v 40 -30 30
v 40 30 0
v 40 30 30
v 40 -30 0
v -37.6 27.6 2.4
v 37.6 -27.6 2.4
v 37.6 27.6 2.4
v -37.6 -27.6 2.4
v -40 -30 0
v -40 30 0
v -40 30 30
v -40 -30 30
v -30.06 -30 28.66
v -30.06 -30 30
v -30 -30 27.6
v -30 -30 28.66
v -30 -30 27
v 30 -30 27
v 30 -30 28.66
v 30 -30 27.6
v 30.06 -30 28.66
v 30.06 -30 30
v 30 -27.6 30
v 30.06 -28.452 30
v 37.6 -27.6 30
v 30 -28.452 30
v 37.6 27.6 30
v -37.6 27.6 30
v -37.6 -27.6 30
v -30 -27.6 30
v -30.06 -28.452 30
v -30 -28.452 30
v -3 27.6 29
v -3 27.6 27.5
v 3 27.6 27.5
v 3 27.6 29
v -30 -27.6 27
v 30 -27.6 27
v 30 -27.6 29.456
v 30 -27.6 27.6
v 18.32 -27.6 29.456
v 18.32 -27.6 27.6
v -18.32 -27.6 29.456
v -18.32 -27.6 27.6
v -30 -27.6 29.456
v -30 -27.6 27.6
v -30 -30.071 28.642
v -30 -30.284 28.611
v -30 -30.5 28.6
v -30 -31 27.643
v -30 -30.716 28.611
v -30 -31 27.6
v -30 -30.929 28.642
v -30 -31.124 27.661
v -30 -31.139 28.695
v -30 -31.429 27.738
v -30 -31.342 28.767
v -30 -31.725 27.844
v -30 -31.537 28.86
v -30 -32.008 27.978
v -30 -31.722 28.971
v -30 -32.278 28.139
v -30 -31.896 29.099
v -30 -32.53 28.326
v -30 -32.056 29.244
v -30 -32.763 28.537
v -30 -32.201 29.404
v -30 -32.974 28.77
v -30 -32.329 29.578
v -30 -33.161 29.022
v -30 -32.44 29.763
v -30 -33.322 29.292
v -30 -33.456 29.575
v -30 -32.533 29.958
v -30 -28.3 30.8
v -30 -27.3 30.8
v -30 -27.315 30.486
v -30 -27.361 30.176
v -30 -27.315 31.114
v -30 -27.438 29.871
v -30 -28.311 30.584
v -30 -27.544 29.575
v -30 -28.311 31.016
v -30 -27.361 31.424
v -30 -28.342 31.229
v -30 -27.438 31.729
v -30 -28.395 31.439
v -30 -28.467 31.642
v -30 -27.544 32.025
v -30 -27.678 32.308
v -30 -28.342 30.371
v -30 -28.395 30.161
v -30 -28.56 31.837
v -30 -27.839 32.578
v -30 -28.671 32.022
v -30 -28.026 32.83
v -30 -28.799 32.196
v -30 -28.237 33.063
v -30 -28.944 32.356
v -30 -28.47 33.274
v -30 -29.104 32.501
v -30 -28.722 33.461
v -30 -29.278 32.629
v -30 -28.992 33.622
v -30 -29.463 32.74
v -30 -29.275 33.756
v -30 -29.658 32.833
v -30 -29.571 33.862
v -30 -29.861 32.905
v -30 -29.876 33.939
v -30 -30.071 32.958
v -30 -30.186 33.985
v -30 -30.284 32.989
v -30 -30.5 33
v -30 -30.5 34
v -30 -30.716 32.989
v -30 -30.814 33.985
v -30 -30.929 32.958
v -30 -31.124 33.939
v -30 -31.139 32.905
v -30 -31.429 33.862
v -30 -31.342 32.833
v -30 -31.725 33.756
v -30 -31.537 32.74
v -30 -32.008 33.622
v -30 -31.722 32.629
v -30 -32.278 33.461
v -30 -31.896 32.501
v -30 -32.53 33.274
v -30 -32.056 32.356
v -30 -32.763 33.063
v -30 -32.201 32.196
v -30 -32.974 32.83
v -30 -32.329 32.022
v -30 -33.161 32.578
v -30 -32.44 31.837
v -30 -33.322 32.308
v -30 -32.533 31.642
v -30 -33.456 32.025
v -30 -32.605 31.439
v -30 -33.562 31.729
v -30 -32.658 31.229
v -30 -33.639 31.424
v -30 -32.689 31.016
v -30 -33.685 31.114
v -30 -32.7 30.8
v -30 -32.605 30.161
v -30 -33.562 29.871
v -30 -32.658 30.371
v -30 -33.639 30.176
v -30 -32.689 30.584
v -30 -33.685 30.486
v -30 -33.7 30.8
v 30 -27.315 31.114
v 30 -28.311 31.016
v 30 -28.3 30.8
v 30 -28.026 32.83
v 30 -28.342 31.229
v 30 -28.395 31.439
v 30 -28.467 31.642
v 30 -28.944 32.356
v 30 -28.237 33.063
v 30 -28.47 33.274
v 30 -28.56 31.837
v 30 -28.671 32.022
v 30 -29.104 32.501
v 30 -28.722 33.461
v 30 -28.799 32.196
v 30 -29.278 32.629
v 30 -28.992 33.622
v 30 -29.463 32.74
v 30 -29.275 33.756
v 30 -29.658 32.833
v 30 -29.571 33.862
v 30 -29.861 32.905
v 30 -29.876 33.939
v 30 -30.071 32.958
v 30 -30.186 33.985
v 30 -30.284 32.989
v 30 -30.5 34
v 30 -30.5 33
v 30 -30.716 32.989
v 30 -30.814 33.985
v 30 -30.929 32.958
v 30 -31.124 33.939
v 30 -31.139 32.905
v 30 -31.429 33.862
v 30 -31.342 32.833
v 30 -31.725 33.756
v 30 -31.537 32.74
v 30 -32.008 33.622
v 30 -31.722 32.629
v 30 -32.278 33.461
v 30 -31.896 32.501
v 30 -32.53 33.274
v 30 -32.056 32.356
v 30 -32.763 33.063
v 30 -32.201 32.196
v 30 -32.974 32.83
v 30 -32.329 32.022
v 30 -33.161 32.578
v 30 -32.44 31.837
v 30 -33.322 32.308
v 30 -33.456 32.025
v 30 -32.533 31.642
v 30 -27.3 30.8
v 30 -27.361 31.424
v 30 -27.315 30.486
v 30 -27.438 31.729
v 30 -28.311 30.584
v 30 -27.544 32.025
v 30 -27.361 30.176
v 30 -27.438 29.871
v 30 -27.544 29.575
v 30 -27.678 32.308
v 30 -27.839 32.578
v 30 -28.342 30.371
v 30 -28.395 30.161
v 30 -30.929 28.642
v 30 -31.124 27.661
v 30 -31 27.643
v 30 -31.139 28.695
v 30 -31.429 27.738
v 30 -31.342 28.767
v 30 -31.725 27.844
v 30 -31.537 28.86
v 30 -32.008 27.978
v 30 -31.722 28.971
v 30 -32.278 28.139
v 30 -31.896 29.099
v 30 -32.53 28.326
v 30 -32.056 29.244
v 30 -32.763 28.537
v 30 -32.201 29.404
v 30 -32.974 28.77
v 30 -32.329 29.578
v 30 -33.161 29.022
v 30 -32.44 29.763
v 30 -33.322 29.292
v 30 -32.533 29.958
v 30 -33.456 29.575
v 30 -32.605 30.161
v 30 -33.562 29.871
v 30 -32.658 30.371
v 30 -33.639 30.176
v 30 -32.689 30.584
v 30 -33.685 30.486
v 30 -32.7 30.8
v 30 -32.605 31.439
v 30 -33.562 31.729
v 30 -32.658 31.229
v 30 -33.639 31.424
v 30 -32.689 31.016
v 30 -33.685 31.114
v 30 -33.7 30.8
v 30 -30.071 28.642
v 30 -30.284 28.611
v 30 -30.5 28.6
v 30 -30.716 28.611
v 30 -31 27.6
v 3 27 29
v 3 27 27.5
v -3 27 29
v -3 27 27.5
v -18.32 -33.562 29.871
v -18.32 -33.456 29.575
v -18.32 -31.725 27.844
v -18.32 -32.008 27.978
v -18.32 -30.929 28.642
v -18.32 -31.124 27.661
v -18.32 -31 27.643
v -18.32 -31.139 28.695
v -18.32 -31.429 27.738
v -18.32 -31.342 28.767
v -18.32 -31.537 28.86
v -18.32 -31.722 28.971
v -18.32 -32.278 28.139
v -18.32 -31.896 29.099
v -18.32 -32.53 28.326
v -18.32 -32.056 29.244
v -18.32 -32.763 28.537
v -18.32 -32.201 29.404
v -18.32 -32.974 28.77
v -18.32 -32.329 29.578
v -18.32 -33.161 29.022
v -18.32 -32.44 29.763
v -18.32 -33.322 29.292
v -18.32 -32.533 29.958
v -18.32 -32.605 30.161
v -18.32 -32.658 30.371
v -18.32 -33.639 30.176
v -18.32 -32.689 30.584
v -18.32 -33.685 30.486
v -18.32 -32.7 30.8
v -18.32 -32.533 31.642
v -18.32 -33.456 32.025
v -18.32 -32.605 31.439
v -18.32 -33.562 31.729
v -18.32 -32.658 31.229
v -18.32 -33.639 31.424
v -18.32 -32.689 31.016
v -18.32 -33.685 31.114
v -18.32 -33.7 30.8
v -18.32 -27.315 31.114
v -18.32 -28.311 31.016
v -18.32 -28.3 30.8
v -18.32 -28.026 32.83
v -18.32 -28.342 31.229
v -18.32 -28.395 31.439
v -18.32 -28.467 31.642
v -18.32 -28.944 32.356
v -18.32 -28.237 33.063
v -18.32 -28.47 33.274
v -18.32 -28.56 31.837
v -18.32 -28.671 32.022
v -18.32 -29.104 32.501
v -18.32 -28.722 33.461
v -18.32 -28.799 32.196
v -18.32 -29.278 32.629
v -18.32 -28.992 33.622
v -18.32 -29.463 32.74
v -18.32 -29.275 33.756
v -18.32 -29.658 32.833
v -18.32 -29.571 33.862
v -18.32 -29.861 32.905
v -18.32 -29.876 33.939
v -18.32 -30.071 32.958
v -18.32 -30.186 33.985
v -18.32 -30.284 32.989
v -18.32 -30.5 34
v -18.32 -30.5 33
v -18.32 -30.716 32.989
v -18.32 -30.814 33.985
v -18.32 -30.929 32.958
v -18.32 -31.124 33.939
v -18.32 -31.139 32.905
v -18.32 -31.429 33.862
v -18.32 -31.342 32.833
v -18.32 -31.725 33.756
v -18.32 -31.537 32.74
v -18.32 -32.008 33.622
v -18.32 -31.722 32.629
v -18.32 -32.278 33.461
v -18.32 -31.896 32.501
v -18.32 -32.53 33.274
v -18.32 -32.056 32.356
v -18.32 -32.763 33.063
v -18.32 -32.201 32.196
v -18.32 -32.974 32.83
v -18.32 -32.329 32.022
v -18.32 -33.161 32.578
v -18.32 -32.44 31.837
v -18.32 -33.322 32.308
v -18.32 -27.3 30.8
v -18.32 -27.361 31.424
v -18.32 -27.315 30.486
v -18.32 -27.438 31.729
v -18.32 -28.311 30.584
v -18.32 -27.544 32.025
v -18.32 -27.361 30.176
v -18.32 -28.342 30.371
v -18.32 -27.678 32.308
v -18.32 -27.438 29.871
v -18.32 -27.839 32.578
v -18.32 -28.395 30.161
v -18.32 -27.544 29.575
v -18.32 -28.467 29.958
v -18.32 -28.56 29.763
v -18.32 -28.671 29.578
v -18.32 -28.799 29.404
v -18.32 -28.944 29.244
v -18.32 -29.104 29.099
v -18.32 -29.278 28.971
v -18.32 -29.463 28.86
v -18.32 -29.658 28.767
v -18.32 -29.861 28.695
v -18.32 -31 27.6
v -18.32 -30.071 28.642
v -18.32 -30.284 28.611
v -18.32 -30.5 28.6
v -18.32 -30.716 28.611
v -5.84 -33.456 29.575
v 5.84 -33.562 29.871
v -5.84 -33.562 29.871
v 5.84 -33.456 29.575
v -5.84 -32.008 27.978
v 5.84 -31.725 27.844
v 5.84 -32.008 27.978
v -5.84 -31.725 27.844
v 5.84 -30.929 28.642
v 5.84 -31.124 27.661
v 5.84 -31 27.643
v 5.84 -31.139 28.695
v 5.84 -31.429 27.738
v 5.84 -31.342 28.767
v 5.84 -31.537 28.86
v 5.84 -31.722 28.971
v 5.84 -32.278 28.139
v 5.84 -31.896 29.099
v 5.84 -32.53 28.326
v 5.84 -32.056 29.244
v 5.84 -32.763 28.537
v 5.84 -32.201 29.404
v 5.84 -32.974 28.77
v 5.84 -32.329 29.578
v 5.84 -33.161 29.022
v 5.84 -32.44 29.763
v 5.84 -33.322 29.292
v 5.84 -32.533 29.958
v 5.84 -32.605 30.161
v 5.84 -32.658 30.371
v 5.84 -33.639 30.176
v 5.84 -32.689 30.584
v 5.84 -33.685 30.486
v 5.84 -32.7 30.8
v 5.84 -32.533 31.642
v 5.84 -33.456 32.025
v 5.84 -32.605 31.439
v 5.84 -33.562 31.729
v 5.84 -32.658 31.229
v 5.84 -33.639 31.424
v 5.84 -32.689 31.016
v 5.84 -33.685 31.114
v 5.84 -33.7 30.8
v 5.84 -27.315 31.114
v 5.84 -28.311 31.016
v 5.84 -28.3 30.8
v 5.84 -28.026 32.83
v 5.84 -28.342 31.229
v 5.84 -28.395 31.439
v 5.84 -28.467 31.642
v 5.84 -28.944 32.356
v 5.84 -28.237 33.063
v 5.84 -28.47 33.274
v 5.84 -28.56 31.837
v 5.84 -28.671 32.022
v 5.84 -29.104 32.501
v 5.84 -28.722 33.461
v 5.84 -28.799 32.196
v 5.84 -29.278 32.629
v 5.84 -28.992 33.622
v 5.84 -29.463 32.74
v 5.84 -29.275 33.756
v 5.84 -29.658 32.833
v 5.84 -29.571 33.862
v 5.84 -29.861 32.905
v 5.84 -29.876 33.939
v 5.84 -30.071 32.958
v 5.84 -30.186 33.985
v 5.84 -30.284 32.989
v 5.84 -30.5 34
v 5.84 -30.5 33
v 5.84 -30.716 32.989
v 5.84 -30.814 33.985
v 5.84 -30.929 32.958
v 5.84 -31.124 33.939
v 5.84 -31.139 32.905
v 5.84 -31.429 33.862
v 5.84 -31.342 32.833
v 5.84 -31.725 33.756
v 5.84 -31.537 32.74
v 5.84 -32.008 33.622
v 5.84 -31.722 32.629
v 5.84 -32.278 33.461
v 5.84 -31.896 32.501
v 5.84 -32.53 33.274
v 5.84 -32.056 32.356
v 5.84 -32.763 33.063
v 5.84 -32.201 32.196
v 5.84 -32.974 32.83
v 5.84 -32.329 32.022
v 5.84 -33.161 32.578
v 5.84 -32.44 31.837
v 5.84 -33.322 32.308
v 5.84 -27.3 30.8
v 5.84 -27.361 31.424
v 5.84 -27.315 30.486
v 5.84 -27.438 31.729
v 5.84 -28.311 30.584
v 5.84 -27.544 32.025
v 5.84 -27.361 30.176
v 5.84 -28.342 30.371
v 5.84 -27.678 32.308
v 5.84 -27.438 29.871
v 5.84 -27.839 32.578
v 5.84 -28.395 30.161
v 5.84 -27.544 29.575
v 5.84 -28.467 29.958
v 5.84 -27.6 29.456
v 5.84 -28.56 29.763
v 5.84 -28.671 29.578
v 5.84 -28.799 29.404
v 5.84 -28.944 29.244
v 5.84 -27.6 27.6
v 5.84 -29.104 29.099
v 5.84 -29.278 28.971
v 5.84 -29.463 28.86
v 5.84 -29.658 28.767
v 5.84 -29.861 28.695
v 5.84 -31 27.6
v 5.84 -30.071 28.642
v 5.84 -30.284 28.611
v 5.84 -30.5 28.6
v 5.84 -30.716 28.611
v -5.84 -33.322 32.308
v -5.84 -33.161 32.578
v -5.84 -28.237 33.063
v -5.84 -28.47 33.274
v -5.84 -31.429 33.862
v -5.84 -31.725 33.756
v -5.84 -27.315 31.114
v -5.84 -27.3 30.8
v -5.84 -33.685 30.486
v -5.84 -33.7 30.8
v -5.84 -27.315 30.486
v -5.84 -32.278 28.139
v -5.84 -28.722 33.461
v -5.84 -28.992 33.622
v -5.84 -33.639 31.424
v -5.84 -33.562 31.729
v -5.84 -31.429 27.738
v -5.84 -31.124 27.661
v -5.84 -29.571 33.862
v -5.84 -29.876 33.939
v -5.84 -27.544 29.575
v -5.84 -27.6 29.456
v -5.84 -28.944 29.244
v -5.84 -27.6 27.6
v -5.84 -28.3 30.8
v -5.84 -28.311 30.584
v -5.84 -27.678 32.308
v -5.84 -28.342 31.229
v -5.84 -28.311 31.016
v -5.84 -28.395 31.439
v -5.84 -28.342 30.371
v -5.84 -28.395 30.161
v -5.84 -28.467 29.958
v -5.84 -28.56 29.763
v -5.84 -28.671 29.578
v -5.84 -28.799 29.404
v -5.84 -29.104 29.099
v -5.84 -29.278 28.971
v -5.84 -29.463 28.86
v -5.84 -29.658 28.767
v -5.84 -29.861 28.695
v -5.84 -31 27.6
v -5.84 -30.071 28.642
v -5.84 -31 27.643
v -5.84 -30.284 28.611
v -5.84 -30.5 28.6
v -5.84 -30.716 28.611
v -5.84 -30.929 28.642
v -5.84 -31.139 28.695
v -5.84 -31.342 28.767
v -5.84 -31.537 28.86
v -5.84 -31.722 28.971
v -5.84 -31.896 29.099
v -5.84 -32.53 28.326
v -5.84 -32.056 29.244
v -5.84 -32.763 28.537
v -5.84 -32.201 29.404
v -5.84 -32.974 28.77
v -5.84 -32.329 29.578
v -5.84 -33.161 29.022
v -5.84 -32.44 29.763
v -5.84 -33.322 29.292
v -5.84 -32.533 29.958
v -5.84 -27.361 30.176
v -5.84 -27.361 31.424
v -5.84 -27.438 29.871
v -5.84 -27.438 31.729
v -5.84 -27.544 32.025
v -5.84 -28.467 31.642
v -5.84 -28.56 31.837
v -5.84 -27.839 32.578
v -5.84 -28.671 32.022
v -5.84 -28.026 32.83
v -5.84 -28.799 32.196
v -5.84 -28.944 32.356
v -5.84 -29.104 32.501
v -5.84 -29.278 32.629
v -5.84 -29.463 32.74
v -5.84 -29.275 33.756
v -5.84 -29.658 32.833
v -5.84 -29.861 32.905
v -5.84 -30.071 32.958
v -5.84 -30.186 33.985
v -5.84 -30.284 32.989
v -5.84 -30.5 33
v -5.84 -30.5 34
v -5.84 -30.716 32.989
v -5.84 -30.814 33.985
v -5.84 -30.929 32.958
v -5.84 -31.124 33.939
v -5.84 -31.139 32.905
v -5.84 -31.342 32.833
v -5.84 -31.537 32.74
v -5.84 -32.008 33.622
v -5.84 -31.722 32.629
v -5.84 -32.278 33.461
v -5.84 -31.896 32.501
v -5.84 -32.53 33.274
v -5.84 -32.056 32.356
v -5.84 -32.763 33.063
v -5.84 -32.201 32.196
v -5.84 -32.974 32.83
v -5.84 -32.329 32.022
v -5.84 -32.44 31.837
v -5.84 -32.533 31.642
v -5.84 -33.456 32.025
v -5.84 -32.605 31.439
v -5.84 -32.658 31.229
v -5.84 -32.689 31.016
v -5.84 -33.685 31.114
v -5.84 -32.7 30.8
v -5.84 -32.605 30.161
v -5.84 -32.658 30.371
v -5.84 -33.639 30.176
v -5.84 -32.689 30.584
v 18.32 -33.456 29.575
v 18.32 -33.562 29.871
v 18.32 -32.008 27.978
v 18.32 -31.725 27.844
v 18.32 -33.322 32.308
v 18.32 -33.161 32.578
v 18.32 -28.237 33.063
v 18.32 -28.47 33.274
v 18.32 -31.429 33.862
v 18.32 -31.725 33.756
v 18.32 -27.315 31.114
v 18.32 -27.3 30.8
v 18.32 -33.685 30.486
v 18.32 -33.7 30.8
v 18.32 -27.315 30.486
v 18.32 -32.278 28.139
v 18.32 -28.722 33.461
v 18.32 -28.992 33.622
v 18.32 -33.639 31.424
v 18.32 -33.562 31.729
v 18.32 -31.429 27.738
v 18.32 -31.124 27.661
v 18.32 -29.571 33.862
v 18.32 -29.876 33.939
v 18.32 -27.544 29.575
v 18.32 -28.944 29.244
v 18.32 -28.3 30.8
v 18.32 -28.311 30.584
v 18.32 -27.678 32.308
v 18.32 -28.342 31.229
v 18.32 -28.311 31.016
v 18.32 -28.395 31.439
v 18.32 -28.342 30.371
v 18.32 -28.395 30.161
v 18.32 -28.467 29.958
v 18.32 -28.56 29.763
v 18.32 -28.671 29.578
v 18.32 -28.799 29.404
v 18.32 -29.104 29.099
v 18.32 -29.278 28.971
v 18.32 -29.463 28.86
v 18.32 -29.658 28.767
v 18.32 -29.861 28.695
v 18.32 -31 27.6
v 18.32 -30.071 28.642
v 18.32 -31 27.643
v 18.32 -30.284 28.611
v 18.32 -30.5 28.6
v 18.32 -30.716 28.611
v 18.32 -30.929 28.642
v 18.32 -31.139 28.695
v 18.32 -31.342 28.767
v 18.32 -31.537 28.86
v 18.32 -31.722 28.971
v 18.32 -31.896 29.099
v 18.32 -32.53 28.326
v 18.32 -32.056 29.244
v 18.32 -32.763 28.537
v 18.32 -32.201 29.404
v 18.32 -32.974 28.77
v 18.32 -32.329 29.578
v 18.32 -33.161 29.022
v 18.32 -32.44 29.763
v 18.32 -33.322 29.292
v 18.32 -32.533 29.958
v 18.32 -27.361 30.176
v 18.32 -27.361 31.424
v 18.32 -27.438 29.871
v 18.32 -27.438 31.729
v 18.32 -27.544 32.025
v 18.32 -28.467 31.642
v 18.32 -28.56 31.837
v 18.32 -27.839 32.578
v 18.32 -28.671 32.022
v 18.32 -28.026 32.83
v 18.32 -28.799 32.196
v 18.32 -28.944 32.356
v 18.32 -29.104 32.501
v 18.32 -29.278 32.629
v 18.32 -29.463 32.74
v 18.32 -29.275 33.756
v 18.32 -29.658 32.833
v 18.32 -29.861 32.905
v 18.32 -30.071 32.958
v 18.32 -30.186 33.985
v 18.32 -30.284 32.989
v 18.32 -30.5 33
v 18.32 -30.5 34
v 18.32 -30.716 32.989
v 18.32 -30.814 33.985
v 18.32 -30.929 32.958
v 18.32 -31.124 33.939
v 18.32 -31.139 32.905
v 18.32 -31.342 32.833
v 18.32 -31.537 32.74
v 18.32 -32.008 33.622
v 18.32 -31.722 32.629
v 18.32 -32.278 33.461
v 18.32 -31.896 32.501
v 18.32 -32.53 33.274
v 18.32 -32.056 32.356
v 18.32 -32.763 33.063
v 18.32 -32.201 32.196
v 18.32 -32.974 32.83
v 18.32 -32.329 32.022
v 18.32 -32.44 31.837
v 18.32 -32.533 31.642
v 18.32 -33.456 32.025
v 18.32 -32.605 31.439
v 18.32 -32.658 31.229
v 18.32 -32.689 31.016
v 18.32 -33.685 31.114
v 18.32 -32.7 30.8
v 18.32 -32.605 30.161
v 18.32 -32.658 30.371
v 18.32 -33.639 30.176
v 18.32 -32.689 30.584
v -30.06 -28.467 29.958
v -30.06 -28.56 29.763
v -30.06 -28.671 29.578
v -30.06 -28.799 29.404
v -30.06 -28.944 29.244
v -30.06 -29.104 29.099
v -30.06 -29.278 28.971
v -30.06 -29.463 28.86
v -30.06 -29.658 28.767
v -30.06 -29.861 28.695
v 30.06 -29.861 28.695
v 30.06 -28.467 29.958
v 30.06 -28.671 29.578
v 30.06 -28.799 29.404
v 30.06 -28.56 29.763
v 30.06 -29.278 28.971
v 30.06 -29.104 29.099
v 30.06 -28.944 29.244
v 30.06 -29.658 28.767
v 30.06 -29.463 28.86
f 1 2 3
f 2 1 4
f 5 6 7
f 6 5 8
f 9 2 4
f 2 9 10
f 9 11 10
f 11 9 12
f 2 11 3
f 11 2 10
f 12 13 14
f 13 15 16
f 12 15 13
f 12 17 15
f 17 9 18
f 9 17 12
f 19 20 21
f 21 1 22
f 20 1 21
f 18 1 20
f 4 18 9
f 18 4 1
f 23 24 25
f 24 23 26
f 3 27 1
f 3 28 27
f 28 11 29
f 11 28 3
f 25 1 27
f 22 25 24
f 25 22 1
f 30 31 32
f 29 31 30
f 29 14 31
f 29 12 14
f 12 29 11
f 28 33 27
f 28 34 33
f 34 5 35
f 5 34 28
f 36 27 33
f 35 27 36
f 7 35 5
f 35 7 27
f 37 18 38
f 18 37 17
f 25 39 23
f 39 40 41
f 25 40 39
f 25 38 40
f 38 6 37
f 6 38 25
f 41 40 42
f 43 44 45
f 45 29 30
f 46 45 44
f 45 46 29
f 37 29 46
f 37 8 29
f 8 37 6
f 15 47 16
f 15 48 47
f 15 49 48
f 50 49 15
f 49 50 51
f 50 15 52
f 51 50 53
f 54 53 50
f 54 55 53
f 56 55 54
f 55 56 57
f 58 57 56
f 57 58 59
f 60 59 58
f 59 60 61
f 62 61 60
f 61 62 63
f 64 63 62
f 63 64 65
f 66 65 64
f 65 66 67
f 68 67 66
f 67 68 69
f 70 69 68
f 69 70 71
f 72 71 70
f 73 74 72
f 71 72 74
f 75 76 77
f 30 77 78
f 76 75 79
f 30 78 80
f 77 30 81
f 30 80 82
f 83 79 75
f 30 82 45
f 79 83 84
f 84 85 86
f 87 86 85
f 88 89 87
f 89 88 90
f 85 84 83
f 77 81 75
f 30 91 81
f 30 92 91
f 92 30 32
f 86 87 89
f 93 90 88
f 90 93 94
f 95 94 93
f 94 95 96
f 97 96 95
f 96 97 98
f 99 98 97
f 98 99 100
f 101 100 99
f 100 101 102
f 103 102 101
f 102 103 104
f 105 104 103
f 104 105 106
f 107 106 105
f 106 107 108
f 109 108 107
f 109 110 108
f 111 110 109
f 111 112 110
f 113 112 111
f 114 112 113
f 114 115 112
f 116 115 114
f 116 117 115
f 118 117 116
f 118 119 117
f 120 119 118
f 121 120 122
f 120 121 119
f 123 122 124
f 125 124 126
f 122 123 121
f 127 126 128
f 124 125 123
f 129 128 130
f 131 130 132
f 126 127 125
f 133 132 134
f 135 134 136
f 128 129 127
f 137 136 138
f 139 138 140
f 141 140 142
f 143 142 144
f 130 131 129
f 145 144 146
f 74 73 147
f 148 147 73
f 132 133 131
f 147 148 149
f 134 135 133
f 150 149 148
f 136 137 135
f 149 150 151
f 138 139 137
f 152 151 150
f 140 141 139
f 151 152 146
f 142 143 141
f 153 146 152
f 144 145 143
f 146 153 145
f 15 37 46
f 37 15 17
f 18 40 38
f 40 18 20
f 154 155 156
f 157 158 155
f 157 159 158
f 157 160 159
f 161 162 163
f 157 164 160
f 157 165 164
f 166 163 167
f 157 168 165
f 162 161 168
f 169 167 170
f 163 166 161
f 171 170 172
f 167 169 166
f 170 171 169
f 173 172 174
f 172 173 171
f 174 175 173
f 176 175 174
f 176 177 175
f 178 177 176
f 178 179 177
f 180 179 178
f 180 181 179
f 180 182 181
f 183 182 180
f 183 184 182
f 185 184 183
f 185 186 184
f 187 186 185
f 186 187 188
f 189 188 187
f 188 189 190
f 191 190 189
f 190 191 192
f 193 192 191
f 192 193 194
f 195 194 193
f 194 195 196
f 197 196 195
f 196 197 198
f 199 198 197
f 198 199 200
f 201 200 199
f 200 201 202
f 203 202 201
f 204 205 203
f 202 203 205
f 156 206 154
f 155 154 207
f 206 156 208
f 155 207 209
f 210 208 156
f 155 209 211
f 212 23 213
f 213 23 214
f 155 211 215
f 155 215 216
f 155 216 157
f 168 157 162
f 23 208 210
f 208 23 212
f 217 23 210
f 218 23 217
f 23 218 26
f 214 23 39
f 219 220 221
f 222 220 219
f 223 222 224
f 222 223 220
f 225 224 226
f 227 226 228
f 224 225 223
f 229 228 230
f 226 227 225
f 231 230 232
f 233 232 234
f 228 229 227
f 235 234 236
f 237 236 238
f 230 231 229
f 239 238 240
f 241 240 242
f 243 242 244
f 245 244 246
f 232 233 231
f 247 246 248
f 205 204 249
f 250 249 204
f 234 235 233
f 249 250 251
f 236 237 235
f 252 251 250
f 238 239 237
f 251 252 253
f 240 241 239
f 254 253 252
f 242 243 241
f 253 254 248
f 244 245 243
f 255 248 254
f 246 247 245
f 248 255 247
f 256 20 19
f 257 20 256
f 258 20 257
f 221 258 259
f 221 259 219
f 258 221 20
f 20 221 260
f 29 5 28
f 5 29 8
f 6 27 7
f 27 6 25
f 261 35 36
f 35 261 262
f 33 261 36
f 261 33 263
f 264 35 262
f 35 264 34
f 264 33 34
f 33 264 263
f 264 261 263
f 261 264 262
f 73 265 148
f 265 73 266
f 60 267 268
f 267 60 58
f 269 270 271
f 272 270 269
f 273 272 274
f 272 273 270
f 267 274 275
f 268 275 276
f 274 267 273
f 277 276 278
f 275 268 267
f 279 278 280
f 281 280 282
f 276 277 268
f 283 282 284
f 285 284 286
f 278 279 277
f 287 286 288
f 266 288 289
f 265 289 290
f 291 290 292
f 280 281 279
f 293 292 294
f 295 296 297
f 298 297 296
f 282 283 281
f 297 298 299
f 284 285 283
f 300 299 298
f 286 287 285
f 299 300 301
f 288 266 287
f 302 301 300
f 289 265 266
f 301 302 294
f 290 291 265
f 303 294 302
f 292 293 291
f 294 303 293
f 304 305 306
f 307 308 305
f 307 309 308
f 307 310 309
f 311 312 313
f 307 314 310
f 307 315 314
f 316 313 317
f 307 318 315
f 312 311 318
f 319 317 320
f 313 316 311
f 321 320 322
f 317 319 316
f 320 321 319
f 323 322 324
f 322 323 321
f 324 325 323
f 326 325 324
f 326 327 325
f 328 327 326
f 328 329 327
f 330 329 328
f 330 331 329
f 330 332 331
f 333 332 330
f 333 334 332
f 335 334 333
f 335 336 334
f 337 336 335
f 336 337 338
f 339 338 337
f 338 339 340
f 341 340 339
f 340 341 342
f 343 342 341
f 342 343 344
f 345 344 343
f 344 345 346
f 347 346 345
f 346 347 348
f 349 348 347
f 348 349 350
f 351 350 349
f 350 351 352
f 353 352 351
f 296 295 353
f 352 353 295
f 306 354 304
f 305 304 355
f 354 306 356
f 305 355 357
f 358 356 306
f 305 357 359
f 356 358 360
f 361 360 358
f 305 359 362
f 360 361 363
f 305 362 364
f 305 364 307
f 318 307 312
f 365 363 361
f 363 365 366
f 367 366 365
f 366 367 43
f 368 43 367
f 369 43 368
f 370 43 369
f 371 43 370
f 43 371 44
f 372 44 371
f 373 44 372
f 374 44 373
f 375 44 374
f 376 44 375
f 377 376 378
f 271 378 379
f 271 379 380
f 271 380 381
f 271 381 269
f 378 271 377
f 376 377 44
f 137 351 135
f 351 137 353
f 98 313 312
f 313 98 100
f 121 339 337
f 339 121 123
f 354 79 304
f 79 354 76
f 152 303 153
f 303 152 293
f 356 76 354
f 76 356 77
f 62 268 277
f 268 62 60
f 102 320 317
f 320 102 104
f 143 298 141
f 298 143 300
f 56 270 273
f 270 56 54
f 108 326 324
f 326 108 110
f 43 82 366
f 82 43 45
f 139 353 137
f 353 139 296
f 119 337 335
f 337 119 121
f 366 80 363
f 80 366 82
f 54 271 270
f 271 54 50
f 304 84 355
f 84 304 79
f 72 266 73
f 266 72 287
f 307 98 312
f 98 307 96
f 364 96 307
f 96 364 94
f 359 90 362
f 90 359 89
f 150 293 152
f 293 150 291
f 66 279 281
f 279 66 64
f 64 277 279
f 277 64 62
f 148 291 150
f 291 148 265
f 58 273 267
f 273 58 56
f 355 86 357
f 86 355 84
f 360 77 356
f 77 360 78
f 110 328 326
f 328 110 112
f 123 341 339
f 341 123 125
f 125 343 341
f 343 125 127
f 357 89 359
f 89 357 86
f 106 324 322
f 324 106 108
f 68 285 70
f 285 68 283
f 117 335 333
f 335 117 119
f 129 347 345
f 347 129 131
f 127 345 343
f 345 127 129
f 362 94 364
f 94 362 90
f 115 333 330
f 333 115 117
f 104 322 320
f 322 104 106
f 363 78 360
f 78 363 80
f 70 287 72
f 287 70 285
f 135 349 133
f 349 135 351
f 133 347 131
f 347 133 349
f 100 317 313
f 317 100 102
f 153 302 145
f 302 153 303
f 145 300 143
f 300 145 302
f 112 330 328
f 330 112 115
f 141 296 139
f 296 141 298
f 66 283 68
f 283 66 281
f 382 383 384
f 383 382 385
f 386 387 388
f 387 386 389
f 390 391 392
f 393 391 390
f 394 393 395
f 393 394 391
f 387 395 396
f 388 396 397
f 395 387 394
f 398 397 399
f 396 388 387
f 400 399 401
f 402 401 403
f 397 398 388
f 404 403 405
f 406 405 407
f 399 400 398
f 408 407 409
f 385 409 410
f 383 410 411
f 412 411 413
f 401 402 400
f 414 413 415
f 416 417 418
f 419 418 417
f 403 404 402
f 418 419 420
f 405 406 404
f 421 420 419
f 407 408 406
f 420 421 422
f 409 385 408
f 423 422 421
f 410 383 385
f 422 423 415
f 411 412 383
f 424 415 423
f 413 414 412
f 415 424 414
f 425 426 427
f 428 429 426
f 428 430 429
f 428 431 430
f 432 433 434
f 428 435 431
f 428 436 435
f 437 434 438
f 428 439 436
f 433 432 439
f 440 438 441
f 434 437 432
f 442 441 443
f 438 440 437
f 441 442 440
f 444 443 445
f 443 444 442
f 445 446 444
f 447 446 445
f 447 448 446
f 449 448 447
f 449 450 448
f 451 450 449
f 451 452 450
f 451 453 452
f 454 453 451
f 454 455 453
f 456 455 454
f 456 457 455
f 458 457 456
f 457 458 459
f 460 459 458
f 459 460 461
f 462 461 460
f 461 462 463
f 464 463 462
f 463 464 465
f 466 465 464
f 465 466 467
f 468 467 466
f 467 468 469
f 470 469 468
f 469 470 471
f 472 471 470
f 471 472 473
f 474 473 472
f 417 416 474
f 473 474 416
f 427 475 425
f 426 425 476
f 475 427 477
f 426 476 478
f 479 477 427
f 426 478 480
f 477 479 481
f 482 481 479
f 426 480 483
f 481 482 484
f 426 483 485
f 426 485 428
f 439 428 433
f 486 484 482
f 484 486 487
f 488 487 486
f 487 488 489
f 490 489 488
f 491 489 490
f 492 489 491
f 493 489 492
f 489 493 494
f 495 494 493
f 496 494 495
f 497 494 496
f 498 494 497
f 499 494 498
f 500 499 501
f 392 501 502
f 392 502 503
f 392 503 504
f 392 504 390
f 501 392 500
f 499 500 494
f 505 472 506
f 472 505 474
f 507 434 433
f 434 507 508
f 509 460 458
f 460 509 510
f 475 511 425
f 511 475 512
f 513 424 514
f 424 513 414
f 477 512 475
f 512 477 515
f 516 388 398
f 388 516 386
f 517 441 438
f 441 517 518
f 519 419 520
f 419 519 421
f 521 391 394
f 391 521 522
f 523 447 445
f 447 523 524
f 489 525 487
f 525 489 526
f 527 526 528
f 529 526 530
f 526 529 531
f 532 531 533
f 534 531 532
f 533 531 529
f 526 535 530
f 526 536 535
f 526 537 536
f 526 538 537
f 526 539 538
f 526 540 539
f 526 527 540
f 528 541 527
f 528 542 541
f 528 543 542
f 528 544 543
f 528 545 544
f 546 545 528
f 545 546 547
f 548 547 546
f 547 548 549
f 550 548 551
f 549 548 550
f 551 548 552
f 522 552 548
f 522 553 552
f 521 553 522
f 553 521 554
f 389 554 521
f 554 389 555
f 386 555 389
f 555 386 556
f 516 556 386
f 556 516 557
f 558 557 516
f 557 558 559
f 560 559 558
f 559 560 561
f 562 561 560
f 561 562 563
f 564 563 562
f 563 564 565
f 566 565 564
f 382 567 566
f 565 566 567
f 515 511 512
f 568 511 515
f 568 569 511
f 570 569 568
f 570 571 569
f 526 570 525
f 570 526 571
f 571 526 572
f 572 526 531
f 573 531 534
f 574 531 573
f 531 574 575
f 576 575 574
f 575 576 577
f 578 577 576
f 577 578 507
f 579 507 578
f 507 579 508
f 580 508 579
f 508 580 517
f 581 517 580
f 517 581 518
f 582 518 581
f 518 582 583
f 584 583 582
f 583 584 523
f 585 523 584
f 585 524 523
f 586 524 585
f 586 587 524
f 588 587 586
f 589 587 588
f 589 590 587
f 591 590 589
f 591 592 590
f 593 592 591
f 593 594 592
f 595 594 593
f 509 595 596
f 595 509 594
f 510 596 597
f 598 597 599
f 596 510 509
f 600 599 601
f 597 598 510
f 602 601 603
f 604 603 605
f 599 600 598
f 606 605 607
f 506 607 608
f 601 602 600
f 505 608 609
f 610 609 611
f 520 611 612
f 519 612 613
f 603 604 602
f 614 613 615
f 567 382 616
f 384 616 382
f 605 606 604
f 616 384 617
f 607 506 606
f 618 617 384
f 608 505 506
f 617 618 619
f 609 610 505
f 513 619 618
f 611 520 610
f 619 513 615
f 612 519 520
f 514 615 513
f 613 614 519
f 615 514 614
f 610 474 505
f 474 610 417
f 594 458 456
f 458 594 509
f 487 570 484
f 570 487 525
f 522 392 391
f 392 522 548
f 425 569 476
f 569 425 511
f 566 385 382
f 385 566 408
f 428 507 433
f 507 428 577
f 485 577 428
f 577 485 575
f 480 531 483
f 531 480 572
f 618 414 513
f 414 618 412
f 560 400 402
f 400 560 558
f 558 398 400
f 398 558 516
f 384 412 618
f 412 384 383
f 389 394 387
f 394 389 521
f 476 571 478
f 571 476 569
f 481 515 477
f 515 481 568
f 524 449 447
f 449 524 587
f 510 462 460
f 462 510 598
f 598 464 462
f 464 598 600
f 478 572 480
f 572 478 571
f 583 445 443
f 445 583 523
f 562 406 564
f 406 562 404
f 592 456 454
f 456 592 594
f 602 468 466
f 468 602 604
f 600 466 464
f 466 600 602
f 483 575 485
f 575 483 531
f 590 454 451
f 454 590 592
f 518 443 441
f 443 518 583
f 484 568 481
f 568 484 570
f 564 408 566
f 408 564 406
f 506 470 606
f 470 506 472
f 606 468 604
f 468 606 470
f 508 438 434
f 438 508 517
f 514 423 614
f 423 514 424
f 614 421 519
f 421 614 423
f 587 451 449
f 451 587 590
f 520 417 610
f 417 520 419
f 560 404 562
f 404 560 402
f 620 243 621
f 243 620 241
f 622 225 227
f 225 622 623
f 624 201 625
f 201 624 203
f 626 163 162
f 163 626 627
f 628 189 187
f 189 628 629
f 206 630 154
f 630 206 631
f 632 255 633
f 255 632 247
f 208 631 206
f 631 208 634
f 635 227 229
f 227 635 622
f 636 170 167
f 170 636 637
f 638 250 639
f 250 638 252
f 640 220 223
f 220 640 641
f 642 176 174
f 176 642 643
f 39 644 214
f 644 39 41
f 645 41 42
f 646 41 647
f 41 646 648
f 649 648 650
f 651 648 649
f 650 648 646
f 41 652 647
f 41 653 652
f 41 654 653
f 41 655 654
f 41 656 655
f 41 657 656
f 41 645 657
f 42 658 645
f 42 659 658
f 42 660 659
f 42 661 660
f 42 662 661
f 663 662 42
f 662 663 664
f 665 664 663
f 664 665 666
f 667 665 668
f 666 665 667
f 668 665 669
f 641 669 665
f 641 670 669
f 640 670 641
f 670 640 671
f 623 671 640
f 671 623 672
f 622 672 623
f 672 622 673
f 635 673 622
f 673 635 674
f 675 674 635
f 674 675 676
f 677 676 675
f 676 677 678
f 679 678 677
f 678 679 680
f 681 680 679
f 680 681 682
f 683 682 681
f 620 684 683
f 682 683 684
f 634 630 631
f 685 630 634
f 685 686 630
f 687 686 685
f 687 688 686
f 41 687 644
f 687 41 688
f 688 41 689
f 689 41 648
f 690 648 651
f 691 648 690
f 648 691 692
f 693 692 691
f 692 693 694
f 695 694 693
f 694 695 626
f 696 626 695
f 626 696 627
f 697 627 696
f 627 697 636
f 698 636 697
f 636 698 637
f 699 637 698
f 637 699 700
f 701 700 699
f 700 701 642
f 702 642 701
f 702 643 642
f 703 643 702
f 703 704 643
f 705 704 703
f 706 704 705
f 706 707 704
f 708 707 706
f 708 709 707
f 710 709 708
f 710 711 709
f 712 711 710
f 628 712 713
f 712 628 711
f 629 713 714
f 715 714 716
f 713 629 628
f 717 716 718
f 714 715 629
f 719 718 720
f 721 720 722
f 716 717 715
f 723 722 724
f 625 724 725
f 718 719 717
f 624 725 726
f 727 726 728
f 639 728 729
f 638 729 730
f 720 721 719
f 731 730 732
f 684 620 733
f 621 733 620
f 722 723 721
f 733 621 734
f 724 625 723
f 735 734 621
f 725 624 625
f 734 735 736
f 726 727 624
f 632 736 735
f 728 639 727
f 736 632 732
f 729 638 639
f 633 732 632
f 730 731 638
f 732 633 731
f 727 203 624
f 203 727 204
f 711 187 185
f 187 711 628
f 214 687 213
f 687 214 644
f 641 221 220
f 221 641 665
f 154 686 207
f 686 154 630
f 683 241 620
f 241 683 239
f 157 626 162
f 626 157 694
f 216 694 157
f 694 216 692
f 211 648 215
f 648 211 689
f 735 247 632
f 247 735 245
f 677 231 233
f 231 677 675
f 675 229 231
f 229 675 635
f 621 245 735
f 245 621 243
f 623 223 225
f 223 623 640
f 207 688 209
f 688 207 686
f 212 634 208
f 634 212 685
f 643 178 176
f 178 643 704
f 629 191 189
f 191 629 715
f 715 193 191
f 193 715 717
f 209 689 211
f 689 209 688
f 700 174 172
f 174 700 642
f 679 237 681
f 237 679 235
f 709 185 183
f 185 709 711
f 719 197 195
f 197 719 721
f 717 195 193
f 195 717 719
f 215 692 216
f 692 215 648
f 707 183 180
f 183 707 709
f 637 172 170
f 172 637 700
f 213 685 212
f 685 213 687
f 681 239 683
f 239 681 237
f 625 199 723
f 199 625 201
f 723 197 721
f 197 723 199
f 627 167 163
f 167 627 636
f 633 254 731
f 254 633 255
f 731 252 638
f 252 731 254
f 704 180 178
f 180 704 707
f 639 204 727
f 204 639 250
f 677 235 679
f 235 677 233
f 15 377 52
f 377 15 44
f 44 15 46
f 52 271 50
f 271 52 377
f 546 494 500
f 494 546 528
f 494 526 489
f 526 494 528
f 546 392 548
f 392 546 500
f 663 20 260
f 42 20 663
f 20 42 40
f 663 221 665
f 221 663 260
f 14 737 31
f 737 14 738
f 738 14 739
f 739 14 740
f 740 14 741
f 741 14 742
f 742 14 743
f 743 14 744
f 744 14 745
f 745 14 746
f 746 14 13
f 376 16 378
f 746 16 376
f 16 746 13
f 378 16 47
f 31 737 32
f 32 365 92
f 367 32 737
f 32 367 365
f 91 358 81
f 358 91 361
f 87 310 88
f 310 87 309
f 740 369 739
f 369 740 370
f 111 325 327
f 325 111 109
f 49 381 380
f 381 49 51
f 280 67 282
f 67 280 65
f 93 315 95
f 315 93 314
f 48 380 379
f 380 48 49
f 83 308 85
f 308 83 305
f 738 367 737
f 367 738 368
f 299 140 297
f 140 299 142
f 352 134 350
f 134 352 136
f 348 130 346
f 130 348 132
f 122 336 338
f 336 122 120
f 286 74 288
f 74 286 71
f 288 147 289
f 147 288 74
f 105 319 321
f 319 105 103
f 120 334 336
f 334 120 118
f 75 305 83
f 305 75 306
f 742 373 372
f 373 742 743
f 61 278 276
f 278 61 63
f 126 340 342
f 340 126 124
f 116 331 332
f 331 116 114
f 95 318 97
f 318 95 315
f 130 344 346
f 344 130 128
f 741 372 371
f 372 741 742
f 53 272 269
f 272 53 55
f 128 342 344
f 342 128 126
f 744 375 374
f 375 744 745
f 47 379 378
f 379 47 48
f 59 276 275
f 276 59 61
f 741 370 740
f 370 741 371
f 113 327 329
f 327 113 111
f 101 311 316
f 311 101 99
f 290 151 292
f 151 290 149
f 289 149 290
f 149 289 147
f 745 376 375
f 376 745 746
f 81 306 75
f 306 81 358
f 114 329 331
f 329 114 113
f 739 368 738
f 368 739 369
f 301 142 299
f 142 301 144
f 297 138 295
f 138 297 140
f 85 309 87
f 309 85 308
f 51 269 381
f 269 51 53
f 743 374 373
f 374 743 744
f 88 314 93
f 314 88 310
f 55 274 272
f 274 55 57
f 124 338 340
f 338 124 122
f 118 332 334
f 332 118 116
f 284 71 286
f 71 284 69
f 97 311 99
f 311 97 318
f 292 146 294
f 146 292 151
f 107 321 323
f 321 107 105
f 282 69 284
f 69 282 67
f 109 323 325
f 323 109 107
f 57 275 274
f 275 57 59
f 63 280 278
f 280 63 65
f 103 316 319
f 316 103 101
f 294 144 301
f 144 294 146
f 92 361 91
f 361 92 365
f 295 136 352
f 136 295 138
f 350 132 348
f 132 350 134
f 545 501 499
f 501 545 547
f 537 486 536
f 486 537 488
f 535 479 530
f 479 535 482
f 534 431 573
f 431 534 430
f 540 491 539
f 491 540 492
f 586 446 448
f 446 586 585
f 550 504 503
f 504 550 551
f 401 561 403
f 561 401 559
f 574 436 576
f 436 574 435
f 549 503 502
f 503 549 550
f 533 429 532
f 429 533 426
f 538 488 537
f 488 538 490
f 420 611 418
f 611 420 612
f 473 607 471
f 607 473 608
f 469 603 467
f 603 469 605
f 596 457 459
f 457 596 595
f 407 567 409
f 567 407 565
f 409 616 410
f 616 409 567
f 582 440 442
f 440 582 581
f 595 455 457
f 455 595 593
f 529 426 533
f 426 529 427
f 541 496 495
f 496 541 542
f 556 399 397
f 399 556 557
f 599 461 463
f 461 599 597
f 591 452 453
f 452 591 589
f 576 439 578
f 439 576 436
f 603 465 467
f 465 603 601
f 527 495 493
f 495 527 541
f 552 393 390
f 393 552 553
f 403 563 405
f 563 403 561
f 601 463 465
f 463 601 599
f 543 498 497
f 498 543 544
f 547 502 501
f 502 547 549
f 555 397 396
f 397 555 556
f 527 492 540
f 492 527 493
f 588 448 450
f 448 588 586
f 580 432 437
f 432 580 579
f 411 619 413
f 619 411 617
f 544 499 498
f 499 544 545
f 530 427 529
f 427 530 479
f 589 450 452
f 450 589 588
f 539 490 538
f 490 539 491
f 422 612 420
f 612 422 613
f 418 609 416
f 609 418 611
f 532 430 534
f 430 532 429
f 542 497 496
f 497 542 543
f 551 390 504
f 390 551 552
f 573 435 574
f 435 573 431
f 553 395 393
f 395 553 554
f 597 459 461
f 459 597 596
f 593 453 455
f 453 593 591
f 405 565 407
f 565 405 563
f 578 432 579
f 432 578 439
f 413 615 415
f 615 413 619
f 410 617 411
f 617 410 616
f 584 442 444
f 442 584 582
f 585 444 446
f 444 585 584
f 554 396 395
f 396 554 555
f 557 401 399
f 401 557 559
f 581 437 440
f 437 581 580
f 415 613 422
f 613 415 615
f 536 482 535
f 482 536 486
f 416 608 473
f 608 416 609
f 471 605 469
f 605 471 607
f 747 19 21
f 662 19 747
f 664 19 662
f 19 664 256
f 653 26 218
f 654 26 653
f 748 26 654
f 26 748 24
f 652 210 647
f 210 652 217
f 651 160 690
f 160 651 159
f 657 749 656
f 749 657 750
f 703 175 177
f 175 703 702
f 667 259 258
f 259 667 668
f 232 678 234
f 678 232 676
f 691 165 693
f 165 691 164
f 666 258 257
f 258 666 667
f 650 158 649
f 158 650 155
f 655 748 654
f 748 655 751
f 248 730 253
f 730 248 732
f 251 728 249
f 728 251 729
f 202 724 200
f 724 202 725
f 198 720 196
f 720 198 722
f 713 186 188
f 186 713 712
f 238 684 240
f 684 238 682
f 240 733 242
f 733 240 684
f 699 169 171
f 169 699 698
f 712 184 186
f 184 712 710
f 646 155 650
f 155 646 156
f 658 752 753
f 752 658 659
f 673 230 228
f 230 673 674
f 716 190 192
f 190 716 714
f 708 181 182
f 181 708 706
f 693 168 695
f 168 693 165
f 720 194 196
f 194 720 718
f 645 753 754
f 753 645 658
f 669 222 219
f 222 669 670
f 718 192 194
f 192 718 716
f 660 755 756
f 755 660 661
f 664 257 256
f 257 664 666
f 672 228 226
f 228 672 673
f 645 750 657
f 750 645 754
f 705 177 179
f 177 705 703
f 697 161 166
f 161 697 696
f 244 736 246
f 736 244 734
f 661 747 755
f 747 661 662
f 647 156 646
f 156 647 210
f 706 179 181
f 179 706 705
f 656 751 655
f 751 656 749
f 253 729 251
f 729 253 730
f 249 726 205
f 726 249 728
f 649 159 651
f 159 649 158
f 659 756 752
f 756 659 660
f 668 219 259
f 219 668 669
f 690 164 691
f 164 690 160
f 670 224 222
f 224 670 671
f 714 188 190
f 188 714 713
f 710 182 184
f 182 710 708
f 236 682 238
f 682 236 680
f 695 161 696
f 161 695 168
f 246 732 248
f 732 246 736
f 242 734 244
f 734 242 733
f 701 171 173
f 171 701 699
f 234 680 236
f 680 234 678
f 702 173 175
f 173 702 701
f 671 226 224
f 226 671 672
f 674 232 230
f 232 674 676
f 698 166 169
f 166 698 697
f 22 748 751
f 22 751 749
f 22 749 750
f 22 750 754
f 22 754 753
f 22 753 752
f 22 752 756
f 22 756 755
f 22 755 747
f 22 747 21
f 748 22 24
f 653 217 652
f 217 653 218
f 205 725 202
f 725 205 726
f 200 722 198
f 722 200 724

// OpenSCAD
// Box with print-in-place hinge (v3: global bore subtraction, hinge cutouts)
part = "box";
cadverify_only = "";
module instance(name, part, unit = 1) {
    echo(cadverify_instance = [name, part, unit]);
    if (cadverify_only == "" || cadverify_only == name) children();
}

Rkn = 3.2; rbore = 2.2; rpin = 1.9;
yh = -30.5; zh = 30.8;
lid_zh = 3.4;
lid_lift = 27.4;
pin_lift_z = 27.8; pin_shift_y = -30.5;
k0x0=-30; k0x1=-18.32;
k1x0=-17.92; k1x1=-6.24;
k2x0=-5.84; k2x1=5.84;
k3x0=6.24; k3x1=17.92;
k4x0=18.32; k4x1=30;

$fn = 64;

module xcyl(x0, x1, r, y, z) {
    translate([x0, y, z]) rotate([0, 90, 0]) cylinder(r = r, h = x1 - x0);
}

module box_part() {
    difference() {
        union() {
            translate([-40, -30, 0]) cube([80, 60, 2.4]);
            translate([-40, 27.6, 2.4]) cube([80, 2.4, 27.6]);
            translate([-40, -30, 2.4]) cube([80, 2.4, 24.6]);
            translate([-40, -30, 27.0]) cube([10, 2.4, 3.0]);
            translate([30, -30, 27.0]) cube([10, 2.4, 3.0]);
            translate([-40, -27.6, 2.4]) cube([2.4, 55.2, 27.6]);
            translate([37.6, -27.6, 2.4]) cube([2.4, 55.2, 27.6]);
            translate([-3, 27.0, 27.5]) cube([6, 0.6, 1.5]);
            xcyl(k0x0, k0x1, Rkn, yh, zh);
            xcyl(k2x0, k2x1, Rkn, yh, zh);
            xcyl(k4x0, k4x1, Rkn, yh, zh);
            translate([k0x0, -31, 27.6]) cube([k0x1-k0x0, 3.4, 3.2]);
            translate([k2x0, -31, 27.6]) cube([k2x1-k2x0, 3.4, 3.2]);
            translate([k4x0, -31, 27.6]) cube([k4x1-k4x0, 3.4, 3.2]);
        }
        xcyl(k0x0-0.06, k0x1+0.06, rbore, yh, zh);
        xcyl(k2x0-0.06, k2x1+0.06, rbore, yh, zh);
        xcyl(k4x0-0.06, k4x1+0.06, rbore, yh, zh);
    }
}

module lid_part() {
    difference() {
        union() {
            translate([-40, -30, 10.6]) cube([80, 60, 2.4]);
            translate([-40, 27.6, 3]) cube([80, 2.4, 7.6]);
            translate([k1x0, -30, 3]) cube([k1x1-k1x0, 2.4, 7.6]);
            translate([k3x0, -30, 3]) cube([k3x1-k3x0, 2.4, 7.6]);
            translate([-40, -30, 3]) cube([10, 2.4, 7.6]);
            translate([30, -30, 3]) cube([10, 2.4, 7.6]);
            translate([-40, -27.6, 3]) cube([2.4, 55.2, 7.6]);
            translate([37.6, -27.6, 3]) cube([2.4, 55.2, 7.6]);
            translate([-37.2, 25.2, 0]) cube([74.4, 2.0, 10.6]);
            translate([-37.2, -27.2, 0]) cube([74.4, 2.0, 10.6]);
            translate([-37.2, -25.2, 0]) cube([2.0, 50.4, 10.6]);
            translate([35.2, -25.2, 0]) cube([2.0, 50.4, 10.6]);
            xcyl(k1x0, k1x1, Rkn, yh, lid_zh);
            xcyl(k3x0, k3x1, Rkn, yh, lid_zh);
            translate([k1x0, -31, 0]) cube([k1x1-k1x0, 3.4, 5]);
            translate([k3x0, -31, 0]) cube([k3x1-k3x0, 3.4, 5]);
        }
        xcyl(k1x0-0.06, k1x1+0.06, rbore, yh, lid_zh);
        xcyl(k3x0-0.06, k3x1+0.06, rbore, yh, lid_zh);
        translate([-3.3, 26.3, -0.05]) cube([6.6, 1.5, 2.05]);
    }
}

module pin_part() {
    union() {
        xcyl(-32.4, 32.4, rpin, 0, 3);
        xcyl(30.4, 32.4, 3, 0, 3);
        xcyl(-32.4, -30.4, 3, 0, 3);
    }
}

if (part == "box") {
    echo(cadverify_spec = [
        ["bounds", [[-40, -33.7, 0], [40, 30, 34.0]]],
        ["bodies", 1],
        ["through_holes", 3],
        ["support_faces", [["bed", "-z", 4000]]],
        ["overhangs_allowed", [["hinge knuckles, bores and wall cutouts print in place", [[-30.2, -33.9, 26.5], [30.2, -27.1, 33.5]]]]],
        ["copies", 1],
        ["details", [
            ["floor", "thickness", [0, 0, -1], [0, 0, 1], 2.4],
            ["front_wall", "thickness", [0, 31, 15], [0, -1, 0], 2.4],
            ["cavity", "void", [[-37.6, -27.6, 2.4], [37.6, 27.6, 29.9]], 0.9],
            ["hinge_bore", "hole", [-31, -30.5, 30.8], [1, 0, 0], [[0, 4.4], [11.6, 4.4]]],
            ["catch_bump", "material", [[-3, 27.0, 27.5], [3, 27.6, 29.0]], 0.9],
            ["hinge_view", "view", [[-30, -34, 26.5], [30, -27, 34.5]]]
        ]]
    ]);
    box_part();
} else if (part == "lid") {
    echo(cadverify_spec = [
        ["bounds", [[-40, -33.7, 0], [40, 30, 13]]],
        ["bodies", 1],
        ["through_holes", 2],
        ["support_faces", [["bed", "-z", 300]]],
        ["overhangs_allowed", [
            ["hinge knuckles and bores print in place", [[-18.2, -33.9, 0], [18.2, -27.1, 4.2]]],
            ["skirt cutout top bridges", [[-30.2, -30.2, 6.5], [30.2, -27.4, 7.5]]],
            ["lid top bridging over plug cavity", [[-37.2, -24.9, 10.1], [37.2, 25.2, 11.1]]]
        ]],
        ["copies", 1],
        ["details", [
            ["top", "thickness", [0, 0, 14], [0, 0, -1], 2.4],
            ["skirt", "thickness", [0, 31, 6], [0, -1, 0], 2.4],
            ["plug_cavity", "void", [[-35.2, -24.9, 0], [35.2, 25.2, 10.5]], 0.9],
            ["hinge_bore", "hole", [-18.6, -30.5, 3.4], [1, 0, 0], [[0, 4.4], [11.6, 4.4]]],
            ["catch_notch", "void", [[-3.3, 26.3, 0], [3.3, 27.8, 2.0]], 0.9],
            ["catch_view", "view", [[-5, 26, 0], [5, 28.5, 3]]]
        ]]
    ]);
    lid_part();
} else if (part == "pin") {
    echo(cadverify_spec = [
        ["bounds", [[-32.4, -3, 0], [32.4, 3, 6]]],
        ["bodies", 1],
        ["support_faces", []],
        ["overhangs_allowed", [["pin shaft underside bridges with 0.3 gap", [[-32.4, -1.9, 0], [32.4, 1.9, 1.6]]]]],
        ["copies", 1],
        ["details", [
            ["shaft", "thickness", [0, 3, 3], [0, -1, 0], 3.8],
            ["head", "material", [[30.4, -3, 0], [32.4, 3, 6]], 0.7],
            ["pin_view", "view", [[-32.4, -3, 0], [32.4, 3, 6]]]
        ]]
    ]);
    pin_part();
} else if (part == "assembly") {
    echo(cadverify_spec = [
        ["bounds", [[-40, -33.7, 0], [40, 30, 40.4]]],
        ["support_faces", [["bed", "-z", 4000]]],
        ["allowed_interferences", []],
        ["motions", [
            ["lid_open", ["lid"], "rotate", [0, -30.5, 30.8], [1, 0, 0], [0, 110], ["flex", [["lid", "box", 0.5, "catch bump clearance pass"]]]]
        ]],
        ["assembly_order", [
            [["box"], [0, 0, 0]],
            [["lid"], [0, 0, -1]],
            [["pin"], [1, 0, 0]]
        ]],
        ["print_in_place", 0.3],
        ["overhangs_allowed", [
            ["hinge undersides, pin bridge and cutouts in place", [[-33, -34, 26.5], [33, -27, 34.8]]],
            ["lid top bridging over box cavity", [[-37.2, -24.9, 37.5], [37.2, 25.2, 38.5]]]
        ]]
    ]);
    instance("box", "box") box_part();
    instance("lid", "lid") translate([0, 0, lid_lift]) lid_part();
    instance("pin", "pin") translate([0, pin_shift_y, pin_lift_z]) pin_part();
}
